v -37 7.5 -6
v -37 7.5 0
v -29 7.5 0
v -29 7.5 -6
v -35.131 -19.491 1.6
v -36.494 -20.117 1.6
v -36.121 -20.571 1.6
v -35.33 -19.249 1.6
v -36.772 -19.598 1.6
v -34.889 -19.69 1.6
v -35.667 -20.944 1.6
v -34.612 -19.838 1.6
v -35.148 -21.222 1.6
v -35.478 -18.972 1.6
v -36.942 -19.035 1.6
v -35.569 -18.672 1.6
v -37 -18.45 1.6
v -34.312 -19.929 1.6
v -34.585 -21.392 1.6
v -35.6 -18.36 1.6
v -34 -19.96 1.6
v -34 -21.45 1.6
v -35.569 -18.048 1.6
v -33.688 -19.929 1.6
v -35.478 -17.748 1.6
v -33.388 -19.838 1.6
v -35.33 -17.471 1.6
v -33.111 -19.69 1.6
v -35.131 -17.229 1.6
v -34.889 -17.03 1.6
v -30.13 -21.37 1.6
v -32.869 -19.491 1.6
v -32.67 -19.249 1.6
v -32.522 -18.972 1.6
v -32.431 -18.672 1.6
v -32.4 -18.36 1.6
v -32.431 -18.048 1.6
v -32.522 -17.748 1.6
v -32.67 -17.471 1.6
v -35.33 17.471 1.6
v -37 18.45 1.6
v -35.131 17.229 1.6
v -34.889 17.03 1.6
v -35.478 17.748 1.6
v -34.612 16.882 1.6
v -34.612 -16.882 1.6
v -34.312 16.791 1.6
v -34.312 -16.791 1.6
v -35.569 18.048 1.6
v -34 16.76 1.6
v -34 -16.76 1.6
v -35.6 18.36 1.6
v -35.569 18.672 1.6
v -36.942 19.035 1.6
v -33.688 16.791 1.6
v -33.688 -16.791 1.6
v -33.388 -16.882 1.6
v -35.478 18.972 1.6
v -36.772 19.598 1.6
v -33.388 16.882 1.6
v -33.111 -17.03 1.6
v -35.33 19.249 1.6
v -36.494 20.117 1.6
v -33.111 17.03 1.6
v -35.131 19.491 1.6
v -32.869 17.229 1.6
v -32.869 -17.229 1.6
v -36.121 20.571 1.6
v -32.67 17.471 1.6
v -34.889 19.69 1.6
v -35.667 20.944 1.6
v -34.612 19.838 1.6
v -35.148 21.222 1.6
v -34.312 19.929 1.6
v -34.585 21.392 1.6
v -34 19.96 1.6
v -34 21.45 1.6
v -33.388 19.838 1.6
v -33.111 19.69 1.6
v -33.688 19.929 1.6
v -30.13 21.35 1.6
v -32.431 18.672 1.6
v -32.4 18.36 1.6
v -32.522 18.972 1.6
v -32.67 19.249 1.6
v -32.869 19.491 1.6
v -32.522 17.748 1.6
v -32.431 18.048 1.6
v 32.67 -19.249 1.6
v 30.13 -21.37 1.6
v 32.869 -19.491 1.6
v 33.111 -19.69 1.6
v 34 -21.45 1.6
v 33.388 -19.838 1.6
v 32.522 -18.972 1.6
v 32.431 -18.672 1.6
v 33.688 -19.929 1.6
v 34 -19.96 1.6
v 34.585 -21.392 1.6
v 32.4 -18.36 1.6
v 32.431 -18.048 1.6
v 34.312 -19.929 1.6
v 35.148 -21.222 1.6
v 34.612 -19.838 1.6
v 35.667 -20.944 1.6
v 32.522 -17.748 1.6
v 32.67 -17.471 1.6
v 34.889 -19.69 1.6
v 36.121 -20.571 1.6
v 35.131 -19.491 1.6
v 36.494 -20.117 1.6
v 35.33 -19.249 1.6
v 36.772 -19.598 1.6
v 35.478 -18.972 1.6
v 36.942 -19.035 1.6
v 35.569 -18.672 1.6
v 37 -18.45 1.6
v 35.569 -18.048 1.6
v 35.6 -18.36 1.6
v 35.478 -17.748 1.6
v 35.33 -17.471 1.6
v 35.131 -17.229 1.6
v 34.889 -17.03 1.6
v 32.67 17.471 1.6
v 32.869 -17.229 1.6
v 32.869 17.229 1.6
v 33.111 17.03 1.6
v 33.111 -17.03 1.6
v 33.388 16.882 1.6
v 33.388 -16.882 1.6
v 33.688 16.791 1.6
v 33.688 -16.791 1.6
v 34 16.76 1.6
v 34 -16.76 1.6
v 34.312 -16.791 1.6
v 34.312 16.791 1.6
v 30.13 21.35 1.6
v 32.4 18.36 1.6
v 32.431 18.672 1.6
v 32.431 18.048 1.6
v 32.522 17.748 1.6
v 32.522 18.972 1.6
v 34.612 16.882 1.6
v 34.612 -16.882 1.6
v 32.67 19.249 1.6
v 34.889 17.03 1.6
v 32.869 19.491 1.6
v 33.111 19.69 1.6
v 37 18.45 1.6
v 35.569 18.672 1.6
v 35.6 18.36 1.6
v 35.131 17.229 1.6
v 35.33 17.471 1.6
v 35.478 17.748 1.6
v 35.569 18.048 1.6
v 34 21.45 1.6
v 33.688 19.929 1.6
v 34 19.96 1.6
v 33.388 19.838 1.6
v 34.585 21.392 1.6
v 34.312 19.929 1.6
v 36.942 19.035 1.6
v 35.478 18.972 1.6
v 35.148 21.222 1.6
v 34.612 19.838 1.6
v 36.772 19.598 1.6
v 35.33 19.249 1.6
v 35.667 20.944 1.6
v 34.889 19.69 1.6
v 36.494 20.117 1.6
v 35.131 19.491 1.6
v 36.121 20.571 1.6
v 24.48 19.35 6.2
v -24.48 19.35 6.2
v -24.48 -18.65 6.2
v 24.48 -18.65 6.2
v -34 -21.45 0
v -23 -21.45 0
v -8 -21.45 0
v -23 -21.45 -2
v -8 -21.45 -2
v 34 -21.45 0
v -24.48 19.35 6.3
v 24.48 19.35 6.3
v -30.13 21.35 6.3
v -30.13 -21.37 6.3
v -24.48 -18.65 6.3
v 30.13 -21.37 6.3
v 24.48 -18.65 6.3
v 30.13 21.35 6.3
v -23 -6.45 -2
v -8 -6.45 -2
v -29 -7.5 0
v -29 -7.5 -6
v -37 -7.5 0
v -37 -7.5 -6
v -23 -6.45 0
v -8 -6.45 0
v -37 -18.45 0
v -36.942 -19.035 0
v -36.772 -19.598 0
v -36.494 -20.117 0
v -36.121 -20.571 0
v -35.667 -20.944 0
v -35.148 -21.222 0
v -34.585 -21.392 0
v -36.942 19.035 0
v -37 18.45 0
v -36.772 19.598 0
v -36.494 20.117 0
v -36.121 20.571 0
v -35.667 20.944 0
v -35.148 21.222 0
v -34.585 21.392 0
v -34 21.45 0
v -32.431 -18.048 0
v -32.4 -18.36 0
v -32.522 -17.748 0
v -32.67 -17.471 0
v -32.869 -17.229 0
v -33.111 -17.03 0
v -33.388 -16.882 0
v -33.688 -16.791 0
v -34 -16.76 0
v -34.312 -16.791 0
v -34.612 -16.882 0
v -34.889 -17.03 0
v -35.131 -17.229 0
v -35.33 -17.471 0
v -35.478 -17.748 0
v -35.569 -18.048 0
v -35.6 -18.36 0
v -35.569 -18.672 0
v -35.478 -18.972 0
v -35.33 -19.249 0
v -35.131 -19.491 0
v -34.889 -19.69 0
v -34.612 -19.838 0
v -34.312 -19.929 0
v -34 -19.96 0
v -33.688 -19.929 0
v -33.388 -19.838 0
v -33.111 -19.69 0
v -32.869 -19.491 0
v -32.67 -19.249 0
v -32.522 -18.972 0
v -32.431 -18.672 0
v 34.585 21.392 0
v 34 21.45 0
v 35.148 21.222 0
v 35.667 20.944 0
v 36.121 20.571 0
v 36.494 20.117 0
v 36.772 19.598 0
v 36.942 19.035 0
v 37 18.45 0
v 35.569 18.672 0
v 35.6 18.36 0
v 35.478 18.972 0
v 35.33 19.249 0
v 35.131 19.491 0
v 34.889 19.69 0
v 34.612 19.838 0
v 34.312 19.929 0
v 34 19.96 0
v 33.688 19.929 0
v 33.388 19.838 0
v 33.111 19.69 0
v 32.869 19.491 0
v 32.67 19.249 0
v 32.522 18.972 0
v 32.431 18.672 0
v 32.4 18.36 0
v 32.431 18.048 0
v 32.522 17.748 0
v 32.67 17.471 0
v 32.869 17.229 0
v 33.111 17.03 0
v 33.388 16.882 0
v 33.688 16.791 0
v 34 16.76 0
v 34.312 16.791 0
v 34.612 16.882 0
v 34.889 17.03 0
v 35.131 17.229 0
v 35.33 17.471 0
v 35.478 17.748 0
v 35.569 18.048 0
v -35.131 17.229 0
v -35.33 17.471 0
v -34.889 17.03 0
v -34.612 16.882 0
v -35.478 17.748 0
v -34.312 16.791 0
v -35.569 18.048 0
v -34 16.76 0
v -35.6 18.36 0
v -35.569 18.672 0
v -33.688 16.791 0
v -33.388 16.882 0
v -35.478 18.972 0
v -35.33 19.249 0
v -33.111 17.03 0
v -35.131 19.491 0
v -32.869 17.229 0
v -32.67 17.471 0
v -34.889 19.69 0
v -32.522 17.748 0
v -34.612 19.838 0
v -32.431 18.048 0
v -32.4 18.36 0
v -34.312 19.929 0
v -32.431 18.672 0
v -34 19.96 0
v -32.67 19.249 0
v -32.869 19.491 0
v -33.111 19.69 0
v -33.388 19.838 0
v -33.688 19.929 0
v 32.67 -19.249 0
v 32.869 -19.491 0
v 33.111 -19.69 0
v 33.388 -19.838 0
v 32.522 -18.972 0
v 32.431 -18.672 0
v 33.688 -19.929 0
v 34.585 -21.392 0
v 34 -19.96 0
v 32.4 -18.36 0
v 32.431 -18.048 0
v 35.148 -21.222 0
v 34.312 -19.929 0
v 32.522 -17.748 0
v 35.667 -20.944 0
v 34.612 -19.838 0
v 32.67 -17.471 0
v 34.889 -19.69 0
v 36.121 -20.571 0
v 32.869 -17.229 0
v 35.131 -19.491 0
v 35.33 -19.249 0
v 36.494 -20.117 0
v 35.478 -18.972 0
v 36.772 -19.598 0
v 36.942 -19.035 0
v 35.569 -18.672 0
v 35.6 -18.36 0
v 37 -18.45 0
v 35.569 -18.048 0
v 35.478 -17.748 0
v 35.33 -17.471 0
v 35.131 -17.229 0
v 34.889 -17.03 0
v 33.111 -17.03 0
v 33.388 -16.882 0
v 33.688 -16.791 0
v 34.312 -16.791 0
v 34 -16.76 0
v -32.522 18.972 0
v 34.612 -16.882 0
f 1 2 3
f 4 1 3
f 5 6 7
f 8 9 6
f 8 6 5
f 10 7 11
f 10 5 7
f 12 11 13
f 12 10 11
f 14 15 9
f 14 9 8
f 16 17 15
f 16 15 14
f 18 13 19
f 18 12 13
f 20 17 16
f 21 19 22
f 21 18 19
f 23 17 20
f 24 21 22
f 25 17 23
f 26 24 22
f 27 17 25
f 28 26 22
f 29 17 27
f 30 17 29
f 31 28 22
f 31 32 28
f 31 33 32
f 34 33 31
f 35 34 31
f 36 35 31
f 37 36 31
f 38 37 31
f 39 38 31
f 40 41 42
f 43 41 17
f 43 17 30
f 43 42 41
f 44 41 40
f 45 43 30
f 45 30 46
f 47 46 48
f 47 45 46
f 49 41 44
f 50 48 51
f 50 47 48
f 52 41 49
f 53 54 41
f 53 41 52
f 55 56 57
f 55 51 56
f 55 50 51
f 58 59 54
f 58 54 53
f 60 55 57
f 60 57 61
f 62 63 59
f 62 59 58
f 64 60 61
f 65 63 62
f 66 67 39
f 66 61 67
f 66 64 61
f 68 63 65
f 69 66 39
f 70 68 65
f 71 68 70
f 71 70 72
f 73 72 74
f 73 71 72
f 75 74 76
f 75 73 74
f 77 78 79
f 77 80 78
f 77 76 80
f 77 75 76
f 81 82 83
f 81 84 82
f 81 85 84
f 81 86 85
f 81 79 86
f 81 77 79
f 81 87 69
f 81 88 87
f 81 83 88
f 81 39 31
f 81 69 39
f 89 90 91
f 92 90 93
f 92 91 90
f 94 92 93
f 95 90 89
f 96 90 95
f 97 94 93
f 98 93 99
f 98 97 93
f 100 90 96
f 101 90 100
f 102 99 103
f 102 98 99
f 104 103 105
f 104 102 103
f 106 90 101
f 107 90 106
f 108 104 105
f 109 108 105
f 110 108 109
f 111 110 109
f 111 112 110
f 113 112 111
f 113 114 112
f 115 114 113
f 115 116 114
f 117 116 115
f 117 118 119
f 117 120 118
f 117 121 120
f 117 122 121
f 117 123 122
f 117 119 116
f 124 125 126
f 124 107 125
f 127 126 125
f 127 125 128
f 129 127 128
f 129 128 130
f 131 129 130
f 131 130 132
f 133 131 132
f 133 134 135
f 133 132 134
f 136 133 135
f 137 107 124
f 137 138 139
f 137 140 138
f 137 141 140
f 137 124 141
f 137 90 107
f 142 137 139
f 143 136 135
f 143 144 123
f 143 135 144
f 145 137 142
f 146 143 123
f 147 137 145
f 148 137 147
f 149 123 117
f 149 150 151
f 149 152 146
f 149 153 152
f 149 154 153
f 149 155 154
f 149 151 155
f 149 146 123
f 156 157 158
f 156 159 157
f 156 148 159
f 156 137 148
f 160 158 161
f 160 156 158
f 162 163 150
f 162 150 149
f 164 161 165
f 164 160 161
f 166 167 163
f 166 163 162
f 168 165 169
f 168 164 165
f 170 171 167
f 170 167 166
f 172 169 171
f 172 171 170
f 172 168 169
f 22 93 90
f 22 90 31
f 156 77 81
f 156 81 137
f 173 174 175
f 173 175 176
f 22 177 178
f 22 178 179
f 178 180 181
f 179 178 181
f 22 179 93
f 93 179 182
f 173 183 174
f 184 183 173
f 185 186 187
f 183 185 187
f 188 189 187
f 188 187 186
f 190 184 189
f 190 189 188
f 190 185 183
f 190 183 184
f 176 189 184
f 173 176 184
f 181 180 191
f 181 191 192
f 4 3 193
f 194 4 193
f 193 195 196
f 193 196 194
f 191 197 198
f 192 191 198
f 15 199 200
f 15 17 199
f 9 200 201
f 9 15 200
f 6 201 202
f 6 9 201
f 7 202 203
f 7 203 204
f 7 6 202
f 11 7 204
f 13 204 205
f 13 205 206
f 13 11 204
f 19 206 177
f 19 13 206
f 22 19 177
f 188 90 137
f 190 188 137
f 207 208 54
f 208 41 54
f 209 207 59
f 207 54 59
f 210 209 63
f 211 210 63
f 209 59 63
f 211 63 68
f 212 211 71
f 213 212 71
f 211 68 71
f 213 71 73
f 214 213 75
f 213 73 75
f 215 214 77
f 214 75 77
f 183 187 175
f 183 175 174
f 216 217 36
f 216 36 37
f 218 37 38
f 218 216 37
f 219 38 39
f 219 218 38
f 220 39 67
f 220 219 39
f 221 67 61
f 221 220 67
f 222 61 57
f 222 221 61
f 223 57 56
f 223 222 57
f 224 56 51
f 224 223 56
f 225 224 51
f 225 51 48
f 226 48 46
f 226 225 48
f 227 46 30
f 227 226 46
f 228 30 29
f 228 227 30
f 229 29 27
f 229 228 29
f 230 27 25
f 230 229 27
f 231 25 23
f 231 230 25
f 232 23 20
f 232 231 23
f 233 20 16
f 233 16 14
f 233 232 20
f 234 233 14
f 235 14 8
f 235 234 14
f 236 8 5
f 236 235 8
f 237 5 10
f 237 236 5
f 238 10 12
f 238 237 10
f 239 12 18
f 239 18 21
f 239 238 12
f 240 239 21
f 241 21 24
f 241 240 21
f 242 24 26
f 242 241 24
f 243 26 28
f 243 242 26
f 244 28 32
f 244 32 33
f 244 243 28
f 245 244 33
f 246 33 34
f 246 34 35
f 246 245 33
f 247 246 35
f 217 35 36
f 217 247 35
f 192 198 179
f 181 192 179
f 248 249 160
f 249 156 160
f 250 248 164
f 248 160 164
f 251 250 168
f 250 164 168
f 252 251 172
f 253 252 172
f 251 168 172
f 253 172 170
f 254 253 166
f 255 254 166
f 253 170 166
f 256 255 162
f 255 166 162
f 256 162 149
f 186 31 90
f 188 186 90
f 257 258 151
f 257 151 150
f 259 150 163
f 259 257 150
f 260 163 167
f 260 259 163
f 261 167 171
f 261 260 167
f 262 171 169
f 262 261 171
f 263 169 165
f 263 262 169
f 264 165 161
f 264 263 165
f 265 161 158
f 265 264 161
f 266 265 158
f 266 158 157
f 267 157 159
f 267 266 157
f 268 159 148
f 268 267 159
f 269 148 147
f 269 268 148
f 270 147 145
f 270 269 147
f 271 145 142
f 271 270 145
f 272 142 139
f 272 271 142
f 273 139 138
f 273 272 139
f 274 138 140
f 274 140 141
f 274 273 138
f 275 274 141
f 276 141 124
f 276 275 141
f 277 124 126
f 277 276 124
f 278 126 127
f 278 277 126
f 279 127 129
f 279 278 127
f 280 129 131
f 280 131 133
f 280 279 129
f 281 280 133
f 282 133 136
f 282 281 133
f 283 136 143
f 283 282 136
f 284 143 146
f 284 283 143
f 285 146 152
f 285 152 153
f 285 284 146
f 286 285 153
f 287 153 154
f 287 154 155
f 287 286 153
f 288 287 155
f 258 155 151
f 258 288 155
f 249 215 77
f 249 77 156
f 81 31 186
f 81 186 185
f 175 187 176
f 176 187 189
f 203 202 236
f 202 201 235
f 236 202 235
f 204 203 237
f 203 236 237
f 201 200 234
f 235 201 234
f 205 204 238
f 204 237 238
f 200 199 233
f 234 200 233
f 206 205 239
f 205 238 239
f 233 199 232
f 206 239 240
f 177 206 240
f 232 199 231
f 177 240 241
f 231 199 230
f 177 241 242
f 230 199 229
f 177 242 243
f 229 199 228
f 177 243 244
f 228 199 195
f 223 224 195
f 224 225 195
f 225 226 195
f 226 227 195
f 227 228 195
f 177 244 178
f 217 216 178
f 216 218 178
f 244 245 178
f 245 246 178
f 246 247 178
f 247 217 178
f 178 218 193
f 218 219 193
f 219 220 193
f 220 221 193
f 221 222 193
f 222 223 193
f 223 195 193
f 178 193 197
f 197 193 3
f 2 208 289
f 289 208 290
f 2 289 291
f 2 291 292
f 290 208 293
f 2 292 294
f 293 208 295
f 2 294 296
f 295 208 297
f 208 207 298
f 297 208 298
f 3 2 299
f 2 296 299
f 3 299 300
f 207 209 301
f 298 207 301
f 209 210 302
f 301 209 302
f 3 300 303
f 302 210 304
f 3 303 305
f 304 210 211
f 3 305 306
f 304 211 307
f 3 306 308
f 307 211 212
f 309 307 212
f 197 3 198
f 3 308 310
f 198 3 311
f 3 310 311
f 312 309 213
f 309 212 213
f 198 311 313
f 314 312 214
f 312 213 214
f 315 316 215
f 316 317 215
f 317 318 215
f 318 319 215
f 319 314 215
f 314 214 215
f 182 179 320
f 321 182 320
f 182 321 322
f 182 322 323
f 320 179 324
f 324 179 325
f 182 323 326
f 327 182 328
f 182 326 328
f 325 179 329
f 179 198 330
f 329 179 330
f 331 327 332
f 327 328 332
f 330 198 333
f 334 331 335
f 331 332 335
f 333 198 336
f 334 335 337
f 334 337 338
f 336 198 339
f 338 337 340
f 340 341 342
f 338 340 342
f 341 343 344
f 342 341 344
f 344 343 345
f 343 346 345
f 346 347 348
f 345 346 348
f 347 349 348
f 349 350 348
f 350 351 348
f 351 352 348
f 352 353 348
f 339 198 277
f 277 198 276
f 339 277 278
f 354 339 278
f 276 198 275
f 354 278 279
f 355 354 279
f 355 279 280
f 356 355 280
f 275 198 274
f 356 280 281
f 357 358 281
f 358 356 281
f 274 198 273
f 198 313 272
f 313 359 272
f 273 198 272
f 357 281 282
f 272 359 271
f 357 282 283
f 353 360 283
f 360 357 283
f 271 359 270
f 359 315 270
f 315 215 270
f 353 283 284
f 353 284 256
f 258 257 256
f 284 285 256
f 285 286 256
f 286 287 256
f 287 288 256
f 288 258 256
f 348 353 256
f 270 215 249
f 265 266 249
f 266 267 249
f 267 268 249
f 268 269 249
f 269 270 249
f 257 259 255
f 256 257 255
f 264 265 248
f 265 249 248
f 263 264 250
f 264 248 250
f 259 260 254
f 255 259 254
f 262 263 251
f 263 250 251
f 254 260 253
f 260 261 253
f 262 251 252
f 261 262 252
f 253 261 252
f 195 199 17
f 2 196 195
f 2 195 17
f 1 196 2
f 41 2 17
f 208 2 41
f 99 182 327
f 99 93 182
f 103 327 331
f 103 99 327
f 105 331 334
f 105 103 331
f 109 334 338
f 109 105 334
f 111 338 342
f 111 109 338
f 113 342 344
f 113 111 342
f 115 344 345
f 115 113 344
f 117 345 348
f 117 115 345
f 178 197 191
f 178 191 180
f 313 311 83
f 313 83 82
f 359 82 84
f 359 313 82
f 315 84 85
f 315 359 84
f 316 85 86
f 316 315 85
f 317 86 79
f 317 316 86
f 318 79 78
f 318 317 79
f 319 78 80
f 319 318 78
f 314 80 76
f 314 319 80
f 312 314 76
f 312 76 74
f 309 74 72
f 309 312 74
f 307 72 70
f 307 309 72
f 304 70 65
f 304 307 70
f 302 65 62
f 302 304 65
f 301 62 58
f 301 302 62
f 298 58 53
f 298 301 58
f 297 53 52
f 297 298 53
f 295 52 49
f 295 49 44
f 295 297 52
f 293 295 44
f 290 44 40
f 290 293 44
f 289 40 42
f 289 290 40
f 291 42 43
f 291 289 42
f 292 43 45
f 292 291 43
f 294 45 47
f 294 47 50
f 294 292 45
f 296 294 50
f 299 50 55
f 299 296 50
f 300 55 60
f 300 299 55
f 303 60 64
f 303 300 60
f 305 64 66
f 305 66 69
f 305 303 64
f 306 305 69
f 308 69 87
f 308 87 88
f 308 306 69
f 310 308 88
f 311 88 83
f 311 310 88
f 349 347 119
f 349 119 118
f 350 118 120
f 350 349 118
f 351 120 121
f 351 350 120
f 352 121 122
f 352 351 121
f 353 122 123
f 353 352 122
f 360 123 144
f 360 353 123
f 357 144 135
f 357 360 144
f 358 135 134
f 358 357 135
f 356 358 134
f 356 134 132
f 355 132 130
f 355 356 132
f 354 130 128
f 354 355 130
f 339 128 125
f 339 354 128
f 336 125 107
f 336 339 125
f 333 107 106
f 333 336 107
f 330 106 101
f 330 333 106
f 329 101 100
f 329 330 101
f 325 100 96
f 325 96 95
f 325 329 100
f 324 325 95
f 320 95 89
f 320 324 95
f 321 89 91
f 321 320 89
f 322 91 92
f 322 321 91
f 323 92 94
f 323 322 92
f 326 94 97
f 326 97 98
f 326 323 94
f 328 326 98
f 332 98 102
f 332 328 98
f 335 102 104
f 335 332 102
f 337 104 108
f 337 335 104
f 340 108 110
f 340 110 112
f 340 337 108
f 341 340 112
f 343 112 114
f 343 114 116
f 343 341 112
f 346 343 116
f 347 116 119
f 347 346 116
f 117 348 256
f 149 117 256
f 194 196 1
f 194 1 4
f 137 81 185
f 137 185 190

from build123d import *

# Parameters (mm, degrees)
F0_W     = 74
F0_H     = 42.9
F0_R     = 1.6
F1_DEPTH = 1.6
F2_W     = 60.26
F2_H     = 42.72
F3_DEPTH = 4.7
F4_W     = 48.96
F4_H     = 38
F5_DEPTH = 0.1
F6_W     = 15
F6_H     = 15
F7_DEPTH = 2
F6_W_2   = 8
F8_DEPTH = 6
F9_R     = 3


with BuildPart() as f1:
    # F0 (on Top) → F1 (new body)
    with BuildSketch(Plane.XY):
        Rectangle(F0_W, F0_H)
        with Locations((-34, -18.36)):
            Circle(F0_R, mode=Mode.SUBTRACT)
        with Locations((34, -18.36)):
            Circle(F0_R, mode=Mode.SUBTRACT)
        with Locations((-34, 18.36)):
            Circle(F0_R, mode=Mode.SUBTRACT)
        with Locations((34, 18.36)):
            Circle(F0_R, mode=Mode.SUBTRACT)
    extrude(amount=F1_DEPTH)

    # F2 (on face) → F3 (join)
    with BuildSketch(Plane.XY.offset(1.6)):
        with Locations((0, -0.01)):
            Rectangle(F2_W, F2_H)
    extrude(amount=F3_DEPTH)

    # F4 (on face) → F5 (cut)
    with BuildSketch(Plane.XY.offset(6.3)):
        with Locations((0, 0.35)):
            Rectangle(F4_W, F4_H)
    extrude(amount=-F5_DEPTH, mode=Mode.SUBTRACT)

    # F6 (on face) → F7 (join)
    with BuildSketch(Plane(origin=(0, 0, 0), x_dir=(1, 0, 0), z_dir=(0, 0, -1))):
        with Locations((-15.5, 13.95)):
            Rectangle(F6_W, F6_H)
    extrude(amount=F7_DEPTH)

    # F6 (on face) → F8 (join)
    with BuildSketch(Plane(origin=(0, 0, 0), x_dir=(1, 0, 0), z_dir=(0, 0, -1))):
        with Locations((-33, 0)):
            Rectangle(F6_W_2, F6_H)
    extrude(amount=F8_DEPTH)

    # F9
    f9_edges = [f1.edges().sort_by_distance(p)[0] for p in [
        (37, 21.45, 0.8),
        (37, -21.45, 0.8),
        (-37, -21.45, 0.8),
        (-37, 21.45, 0.8),
    ]]
    fillet(f9_edges, radius=F9_R)


solid = f1.part
